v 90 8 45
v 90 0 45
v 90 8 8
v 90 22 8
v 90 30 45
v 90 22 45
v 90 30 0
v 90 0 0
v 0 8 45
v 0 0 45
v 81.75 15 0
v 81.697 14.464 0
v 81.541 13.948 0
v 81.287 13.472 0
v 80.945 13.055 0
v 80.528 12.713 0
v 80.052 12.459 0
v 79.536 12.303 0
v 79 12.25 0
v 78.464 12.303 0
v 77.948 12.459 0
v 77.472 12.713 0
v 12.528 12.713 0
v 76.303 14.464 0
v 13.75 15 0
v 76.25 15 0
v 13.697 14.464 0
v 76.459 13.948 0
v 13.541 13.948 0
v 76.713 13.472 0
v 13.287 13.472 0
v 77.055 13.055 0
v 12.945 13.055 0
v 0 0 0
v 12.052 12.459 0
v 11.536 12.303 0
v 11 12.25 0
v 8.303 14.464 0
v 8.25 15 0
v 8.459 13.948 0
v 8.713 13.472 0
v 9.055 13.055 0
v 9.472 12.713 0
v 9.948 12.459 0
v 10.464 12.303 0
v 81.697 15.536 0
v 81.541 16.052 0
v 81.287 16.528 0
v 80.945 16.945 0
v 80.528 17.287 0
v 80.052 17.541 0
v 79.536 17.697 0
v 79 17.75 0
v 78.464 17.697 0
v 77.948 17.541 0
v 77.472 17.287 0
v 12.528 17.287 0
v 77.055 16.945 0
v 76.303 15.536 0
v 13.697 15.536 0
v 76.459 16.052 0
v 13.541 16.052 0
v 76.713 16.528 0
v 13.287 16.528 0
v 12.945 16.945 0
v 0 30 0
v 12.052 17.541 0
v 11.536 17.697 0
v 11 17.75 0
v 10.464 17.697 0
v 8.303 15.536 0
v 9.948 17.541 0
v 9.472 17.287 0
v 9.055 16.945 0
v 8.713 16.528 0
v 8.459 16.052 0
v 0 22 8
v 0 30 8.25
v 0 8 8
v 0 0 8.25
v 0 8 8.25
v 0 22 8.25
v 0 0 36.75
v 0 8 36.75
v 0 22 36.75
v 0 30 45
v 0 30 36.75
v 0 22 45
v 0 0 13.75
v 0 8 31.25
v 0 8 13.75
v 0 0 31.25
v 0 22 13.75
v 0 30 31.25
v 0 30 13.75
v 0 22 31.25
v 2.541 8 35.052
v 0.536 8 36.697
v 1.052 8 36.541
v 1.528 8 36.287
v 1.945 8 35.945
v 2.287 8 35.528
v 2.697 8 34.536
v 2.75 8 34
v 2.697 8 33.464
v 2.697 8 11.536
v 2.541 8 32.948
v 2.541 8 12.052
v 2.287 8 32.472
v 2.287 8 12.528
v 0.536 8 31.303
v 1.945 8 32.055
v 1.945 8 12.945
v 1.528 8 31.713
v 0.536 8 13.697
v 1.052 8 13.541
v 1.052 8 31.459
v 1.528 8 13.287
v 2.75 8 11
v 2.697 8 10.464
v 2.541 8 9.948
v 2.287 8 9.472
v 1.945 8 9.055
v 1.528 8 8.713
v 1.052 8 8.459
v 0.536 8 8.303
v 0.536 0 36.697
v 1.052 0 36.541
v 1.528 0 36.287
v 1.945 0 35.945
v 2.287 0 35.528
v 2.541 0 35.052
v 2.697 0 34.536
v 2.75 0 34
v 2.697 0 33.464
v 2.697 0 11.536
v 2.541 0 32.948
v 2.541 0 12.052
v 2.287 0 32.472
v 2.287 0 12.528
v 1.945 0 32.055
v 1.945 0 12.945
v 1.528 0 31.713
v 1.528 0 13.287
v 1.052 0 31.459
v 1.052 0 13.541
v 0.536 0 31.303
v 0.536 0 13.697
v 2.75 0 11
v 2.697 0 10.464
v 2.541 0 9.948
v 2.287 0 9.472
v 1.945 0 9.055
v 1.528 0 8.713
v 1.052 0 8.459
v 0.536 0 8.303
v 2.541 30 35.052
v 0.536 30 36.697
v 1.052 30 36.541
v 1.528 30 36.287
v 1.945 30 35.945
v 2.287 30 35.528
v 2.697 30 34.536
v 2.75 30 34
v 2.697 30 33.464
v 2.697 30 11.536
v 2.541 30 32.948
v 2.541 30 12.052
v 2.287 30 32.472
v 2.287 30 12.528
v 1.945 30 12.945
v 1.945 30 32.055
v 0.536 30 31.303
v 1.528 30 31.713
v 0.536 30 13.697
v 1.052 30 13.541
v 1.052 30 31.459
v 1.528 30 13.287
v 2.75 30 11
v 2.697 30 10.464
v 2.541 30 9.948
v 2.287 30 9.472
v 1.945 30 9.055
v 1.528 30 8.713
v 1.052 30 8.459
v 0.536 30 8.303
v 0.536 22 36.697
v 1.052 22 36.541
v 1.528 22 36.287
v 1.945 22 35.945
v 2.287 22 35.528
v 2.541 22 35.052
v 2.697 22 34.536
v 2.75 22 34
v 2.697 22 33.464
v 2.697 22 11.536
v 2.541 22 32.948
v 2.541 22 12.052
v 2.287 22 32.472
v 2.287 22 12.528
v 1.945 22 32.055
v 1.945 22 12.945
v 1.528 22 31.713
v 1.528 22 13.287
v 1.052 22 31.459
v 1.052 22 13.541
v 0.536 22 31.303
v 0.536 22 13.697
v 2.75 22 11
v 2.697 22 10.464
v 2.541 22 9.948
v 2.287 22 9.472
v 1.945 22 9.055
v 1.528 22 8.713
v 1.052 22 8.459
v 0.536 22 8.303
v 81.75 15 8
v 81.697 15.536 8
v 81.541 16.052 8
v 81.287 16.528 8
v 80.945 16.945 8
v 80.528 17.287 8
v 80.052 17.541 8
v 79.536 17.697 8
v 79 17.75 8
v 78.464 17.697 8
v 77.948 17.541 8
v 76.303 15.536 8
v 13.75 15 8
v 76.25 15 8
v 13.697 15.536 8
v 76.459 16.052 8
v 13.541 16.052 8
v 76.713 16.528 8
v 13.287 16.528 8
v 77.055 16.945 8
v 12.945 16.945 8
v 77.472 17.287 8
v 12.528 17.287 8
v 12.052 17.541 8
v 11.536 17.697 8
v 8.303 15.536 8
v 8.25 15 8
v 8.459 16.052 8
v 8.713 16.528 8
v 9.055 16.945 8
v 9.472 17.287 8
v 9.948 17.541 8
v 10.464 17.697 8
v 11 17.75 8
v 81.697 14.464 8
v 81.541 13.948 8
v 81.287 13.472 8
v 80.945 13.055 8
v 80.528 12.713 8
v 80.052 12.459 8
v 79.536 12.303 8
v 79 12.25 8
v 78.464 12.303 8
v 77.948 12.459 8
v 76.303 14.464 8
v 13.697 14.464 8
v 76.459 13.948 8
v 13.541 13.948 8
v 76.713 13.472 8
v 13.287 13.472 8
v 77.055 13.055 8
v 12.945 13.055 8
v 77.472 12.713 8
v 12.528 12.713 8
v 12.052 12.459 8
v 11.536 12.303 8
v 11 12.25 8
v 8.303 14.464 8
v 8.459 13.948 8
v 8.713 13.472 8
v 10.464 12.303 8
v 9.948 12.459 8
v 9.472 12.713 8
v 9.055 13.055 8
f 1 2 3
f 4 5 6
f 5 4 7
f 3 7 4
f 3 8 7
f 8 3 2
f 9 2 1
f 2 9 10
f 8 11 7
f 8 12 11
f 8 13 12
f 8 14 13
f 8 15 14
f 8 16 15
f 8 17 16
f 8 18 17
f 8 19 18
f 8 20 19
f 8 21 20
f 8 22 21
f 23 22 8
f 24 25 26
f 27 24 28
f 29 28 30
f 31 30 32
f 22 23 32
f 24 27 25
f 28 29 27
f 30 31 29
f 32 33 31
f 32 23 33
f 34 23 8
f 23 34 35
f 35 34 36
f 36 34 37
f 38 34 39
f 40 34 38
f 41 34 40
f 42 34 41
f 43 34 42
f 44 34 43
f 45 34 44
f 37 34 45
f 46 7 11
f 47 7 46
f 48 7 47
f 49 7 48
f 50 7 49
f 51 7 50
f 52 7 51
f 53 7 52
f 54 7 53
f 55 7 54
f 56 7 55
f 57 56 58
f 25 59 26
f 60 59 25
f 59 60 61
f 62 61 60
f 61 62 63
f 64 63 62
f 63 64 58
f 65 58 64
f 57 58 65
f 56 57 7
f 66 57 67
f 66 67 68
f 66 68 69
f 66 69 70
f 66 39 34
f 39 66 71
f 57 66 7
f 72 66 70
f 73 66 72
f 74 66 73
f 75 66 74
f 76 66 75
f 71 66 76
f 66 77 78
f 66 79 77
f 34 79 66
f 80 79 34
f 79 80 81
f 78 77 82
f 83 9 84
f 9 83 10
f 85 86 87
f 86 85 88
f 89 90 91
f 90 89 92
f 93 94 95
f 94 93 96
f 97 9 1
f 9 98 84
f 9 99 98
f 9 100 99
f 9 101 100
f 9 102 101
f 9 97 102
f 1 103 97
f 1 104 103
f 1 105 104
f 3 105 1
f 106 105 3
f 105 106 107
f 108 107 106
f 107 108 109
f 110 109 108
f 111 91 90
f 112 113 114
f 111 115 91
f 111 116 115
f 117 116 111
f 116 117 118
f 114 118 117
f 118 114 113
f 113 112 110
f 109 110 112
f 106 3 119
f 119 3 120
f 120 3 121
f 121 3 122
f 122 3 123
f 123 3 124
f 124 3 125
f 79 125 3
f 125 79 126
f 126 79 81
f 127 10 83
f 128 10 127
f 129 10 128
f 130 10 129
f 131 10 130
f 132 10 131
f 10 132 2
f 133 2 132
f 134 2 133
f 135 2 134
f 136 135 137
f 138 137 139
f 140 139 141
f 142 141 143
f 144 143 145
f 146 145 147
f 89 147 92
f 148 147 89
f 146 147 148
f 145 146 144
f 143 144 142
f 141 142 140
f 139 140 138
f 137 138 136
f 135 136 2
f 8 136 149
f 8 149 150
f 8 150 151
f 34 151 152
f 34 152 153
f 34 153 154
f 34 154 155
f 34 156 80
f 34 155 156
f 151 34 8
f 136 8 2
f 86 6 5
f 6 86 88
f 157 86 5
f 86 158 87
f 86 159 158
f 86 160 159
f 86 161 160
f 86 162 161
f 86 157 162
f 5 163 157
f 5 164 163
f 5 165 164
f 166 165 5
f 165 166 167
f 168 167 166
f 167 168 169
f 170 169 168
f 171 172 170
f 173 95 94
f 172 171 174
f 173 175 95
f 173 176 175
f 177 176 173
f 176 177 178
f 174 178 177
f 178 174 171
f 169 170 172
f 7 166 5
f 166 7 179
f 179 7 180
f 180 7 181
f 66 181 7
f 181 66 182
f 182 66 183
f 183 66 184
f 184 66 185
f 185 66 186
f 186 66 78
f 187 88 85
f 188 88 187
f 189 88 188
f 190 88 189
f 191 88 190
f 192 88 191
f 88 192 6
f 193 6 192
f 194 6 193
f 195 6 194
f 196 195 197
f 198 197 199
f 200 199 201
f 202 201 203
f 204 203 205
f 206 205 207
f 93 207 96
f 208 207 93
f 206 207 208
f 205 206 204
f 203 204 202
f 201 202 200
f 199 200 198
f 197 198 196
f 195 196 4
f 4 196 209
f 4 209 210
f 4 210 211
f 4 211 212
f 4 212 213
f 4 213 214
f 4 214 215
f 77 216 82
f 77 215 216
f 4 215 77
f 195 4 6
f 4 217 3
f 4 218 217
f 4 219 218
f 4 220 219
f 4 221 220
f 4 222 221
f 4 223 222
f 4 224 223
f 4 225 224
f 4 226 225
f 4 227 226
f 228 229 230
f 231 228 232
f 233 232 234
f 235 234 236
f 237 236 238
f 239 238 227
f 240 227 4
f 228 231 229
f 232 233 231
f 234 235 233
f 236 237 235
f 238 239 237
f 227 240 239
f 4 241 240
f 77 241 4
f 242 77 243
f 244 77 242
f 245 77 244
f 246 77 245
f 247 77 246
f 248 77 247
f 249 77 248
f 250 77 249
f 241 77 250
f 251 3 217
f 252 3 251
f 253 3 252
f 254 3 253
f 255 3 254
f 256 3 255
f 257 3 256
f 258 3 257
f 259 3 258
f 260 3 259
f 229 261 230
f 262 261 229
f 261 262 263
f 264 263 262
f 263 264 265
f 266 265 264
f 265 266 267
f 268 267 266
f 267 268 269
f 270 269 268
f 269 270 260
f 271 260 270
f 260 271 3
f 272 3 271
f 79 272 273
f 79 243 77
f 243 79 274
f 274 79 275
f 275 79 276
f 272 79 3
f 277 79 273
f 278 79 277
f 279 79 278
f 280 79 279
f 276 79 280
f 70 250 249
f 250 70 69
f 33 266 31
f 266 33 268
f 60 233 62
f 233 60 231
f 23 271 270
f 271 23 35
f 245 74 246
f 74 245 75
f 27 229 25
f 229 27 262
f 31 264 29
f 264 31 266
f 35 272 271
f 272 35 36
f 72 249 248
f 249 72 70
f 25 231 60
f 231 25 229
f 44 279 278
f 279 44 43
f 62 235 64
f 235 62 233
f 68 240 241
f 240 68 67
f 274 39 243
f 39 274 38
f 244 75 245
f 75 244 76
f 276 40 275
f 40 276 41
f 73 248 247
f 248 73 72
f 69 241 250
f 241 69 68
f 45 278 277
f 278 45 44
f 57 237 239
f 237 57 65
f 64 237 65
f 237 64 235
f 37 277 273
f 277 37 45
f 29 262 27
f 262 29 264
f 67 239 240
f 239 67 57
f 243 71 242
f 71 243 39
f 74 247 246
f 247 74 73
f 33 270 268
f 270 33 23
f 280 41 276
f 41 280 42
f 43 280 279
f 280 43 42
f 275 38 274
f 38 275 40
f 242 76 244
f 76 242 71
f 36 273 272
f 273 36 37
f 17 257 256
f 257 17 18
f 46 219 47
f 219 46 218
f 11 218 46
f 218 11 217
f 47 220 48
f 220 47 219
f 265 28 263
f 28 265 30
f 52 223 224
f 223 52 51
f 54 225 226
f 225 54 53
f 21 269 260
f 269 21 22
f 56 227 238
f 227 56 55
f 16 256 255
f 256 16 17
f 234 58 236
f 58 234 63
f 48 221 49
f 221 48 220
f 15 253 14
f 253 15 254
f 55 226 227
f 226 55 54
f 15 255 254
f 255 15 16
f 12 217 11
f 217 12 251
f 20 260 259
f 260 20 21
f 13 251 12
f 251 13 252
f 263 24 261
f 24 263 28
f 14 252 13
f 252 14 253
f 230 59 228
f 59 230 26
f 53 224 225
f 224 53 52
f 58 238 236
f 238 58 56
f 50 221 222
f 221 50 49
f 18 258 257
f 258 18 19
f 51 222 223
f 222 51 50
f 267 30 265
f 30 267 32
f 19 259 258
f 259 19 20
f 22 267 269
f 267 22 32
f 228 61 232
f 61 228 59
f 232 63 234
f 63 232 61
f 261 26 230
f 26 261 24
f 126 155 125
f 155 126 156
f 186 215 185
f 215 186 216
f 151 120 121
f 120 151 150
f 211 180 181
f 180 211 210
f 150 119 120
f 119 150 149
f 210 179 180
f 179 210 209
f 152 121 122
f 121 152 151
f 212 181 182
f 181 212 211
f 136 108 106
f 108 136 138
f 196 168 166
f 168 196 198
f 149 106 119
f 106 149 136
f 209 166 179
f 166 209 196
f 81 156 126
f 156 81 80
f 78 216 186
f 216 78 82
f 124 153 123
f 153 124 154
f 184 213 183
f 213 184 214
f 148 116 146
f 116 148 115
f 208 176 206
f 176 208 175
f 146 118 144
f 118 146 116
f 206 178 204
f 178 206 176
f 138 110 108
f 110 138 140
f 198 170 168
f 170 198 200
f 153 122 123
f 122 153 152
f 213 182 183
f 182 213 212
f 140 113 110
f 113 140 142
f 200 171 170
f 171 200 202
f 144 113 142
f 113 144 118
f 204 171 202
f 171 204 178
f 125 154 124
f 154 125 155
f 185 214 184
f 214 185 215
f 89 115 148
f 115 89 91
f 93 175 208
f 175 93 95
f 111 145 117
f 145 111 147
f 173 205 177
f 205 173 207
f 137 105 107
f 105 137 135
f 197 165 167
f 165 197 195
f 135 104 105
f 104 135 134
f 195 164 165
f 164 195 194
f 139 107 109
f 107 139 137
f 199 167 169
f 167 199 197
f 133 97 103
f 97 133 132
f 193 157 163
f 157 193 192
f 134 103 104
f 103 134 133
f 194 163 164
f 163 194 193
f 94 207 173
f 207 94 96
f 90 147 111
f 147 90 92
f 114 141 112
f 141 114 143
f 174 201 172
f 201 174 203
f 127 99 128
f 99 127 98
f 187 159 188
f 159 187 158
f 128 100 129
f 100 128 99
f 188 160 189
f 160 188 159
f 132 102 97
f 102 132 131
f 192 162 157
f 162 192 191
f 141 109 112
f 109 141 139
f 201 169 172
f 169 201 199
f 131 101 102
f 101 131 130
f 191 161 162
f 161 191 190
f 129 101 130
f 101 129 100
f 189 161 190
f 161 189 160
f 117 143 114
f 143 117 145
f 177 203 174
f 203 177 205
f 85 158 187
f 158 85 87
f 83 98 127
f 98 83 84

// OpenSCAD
$fn = 32;

// ----------------------------------------------------------------------
// U-bracket: 90 x 30 x 45 mm
// ----------------------------------------------------------------------

// --- parameters (mm) ---
base_len = 90;            // outer length, X
channel_w = 30;           // outer width, Y
upright_h = 45;           // upright height, Z
mat_t = 8;                // wall thickness
hole_d = 5.5;             // clearance for M5

module hole_z(px, py) {
  translate([px, py, -2.5]) cylinder(h = mat_t + 5, d = hole_d);
}
module hole_y_pz(pz) {
  /* through both uprights along Y */
  translate([0, -2.5, pz]) rotate([-90, 0, 0]) cylinder(h = channel_w + 5, d = hole_d);
}

module base() {
  cube([base_len, channel_w, mat_t]);
}

module uprights() {
  cube([base_len, mat_t, upright_h]);
  translate([0, channel_w - mat_t, 0]) cube([base_len, mat_t, upright_h]);
}

difference() {
  union() {
    base();
    uprights();
  }
  hole_z(11, 15);
  hole_z(79, 15);
  hole_y_pz(11);
  hole_y_pz(34);
}
